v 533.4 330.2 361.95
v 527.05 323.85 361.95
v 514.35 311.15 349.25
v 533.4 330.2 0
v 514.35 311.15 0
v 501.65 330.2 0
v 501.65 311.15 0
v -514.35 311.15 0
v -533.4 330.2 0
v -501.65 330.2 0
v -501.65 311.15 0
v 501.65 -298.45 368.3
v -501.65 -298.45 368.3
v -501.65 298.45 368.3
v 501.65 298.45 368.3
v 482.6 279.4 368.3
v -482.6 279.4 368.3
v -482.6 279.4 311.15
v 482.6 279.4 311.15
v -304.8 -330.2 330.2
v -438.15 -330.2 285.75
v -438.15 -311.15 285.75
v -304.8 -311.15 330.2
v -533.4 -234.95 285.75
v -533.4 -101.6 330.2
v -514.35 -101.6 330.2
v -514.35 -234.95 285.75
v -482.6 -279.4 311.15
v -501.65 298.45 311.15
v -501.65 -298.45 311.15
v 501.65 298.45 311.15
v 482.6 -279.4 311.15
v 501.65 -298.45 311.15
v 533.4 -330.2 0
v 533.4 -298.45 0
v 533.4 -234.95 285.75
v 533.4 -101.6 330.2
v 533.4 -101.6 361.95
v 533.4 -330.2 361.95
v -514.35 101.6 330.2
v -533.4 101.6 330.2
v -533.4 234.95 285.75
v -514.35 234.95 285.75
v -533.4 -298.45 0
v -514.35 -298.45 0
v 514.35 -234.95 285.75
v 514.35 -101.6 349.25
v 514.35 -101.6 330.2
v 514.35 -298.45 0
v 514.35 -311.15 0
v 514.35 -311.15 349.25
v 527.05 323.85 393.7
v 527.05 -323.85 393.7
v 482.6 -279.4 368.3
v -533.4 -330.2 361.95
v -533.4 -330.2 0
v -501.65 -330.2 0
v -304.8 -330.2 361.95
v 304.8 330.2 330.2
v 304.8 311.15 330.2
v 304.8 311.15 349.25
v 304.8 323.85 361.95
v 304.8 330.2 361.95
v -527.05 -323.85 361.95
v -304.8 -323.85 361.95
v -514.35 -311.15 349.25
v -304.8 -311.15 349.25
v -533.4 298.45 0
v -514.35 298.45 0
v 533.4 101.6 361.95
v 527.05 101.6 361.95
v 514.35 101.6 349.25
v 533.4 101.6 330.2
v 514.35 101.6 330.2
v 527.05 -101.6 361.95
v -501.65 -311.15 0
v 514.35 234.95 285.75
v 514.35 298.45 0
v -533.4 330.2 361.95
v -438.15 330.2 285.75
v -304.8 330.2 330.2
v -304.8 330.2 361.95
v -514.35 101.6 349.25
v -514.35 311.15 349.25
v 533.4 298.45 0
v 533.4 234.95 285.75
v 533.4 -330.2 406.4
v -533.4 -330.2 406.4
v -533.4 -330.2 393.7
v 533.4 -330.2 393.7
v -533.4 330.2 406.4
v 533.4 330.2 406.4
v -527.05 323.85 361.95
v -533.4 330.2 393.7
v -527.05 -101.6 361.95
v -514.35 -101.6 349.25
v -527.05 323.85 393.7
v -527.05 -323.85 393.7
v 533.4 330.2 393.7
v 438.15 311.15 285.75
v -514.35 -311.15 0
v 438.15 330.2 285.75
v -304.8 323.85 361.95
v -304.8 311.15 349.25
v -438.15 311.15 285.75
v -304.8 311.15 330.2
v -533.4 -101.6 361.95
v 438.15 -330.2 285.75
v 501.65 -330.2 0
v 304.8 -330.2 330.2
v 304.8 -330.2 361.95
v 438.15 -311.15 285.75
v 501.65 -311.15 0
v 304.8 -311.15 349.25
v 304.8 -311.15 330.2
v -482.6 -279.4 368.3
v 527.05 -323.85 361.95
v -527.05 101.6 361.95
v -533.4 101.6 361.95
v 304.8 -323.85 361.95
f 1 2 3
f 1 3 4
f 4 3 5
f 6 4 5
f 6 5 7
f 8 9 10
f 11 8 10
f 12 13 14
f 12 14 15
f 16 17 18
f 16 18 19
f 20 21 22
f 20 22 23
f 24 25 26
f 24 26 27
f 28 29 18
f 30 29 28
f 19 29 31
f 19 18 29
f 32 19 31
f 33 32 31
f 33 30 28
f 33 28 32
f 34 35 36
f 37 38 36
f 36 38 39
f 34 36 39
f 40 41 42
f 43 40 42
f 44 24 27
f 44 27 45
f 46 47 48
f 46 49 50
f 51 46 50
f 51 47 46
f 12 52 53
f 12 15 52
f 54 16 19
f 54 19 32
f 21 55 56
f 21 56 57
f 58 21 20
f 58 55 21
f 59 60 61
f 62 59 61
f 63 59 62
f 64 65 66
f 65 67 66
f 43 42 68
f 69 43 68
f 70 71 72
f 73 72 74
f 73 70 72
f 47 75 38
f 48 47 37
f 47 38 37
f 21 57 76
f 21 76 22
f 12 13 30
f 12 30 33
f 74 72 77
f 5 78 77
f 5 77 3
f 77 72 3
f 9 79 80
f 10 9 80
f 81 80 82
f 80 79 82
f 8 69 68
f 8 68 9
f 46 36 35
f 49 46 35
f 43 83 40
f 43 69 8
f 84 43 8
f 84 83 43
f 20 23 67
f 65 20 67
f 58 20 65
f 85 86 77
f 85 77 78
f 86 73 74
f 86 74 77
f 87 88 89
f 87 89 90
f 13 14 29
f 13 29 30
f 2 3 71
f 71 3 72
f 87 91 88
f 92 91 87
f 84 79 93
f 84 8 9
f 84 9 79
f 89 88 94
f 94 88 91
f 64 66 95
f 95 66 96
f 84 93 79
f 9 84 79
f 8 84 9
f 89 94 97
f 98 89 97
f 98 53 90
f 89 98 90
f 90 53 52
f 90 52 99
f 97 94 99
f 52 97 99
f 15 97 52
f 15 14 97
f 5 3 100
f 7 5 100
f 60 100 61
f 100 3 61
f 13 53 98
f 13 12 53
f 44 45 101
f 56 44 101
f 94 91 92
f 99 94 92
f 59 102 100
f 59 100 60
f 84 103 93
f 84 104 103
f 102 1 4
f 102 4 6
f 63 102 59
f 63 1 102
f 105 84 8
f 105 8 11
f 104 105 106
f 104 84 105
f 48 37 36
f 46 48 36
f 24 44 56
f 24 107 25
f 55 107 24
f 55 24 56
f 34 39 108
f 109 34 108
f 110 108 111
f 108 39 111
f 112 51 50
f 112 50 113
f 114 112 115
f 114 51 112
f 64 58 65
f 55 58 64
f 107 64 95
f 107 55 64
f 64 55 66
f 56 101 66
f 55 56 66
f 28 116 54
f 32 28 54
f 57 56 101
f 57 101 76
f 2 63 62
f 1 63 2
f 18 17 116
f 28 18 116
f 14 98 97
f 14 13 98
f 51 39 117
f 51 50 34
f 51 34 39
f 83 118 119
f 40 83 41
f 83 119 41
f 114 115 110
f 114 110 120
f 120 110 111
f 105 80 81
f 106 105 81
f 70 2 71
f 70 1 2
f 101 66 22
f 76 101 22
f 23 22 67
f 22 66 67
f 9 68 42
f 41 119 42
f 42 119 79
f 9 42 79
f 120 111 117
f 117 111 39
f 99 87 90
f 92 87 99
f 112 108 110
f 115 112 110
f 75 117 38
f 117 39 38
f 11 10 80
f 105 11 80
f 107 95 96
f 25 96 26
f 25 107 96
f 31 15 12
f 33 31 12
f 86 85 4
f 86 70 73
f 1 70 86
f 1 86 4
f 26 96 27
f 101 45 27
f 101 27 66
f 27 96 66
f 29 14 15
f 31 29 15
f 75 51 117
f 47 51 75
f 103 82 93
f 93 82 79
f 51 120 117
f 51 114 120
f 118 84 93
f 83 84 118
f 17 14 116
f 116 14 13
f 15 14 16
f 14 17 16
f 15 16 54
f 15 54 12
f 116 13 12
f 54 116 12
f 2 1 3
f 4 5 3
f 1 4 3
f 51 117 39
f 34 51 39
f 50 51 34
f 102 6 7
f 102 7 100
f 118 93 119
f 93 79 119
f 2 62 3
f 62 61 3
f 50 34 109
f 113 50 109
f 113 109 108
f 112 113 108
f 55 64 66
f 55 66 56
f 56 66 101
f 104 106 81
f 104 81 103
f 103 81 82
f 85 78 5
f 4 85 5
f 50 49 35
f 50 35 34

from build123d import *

# Parameters (mm, degrees)
F1_W      = 1066.8
F1_H      = 660.4
F2_DEPTH  = 12.7
F3_W      = 1054.1
F3_H      = 647.7
F4_DEPTH  = 25.4
F4_TAPER  = 45
F6_DEPTH  = 19.05
F7_SIZE   = 12.7
F8_SIZE   = 19.04999
F10_DEPTH = 19.05
F11_SIZE  = 12.7
F12_SIZE  = 19.04999
F15_W     = 1003.3
F15_H     = 596.9
F15_W_2   = 965.2
F15_H_2   = 558.8
F16_DEPTH = 57.15


# Not quite as in the source:
# - a fillet or chamfer is up to 0.001 mm smaller than in the source, because OpenCascade refuses the exact size


with BuildPart() as f2:
    # F1 (on offset) → F2 (new body)
    with BuildSketch(Plane.XY.offset(406.4)):
        Rectangle(F1_W, F1_H)
    extrude(amount=-F2_DEPTH)

    # F3 (on face) → F4 (join)
    with BuildSketch(Plane(origin=(0, 0, 393.7), x_dir=(1, 0, 0), z_dir=(0, 0, -1))):
        Rectangle(F3_W, F3_H)
    extrude(amount=F4_DEPTH, taper=F4_TAPER)


with BuildPart() as f6:
    # F5 (on face) → F6 (new body)
    with BuildSketch(Plane.XZ.offset(330.2)):
        Polygon((-304.8, 361.95), (-533.4, 361.95), (-533.4, 0), (-501.65, 0), (-438.15, 285.75), (-304.8, 330.2), align=None)
    extrude(amount=-F6_DEPTH)

    # F7
    f7_edges = [f6.edges().sort_by_distance(p)[0] for p in [
        (-419.1, -311.15, 361.95),
    ]]
    chamfer(f7_edges, length=F7_SIZE)

    # F8 (size 19.05 in the source; OpenCascade refuses exactly that, so slightly less here)
    f8_edges = [f6.edges().sort_by_distance(p)[0] for p in [
        (-533.4, -311.15, 174.625),
    ]]
    chamfer(f8_edges, length=F8_SIZE)


with BuildPart() as f10:
    # F9 (on face) → F10 (new body)
    with BuildSketch(Plane(origin=(-533.4, 0, 0), x_dir=(0, -1, 0), z_dir=(-1, 0, 0))):
        Polygon((234.95, 285.75), (298.45, 0), (330.2, 0), (330.2, 361.95), (101.6, 361.95), (101.6, 330.2), align=None)
    extrude(amount=-F10_DEPTH)

    # F11
    f11_edges = [f10.edges().sort_by_distance(p)[0] for p in [
        (-514.35, -215.9, 361.95),
    ]]
    chamfer(f11_edges, length=F11_SIZE)

    # F12 (size 19.05 in the source; OpenCascade refuses exactly that, so slightly less here)
    f12_edges = [f10.edges().sort_by_distance(p)[0] for p in [
        (-514.35, -330.2, 174.625),
    ]]
    chamfer(f12_edges, length=F12_SIZE)


with BuildPart() as f13_1:
    # F13: instance of F6
    add(f6.part.mirror(Plane.XZ))


with BuildPart() as f13_2:
    # F13: instance of F10
    add(f10.part.mirror(Plane.XZ))


with BuildPart() as f14_1:
    # F14: instance of F6
    add(f6.part.mirror(Plane.YZ))


with BuildPart() as f14_2:
    # F14: instance of F10
    add(f10.part.mirror(Plane.YZ))


with BuildPart() as f14_3:
    # F14: instance of F13_1
    add(f13_1.part.mirror(Plane.YZ))


with BuildPart() as f14_4:
    # F14: instance of F13_2
    add(f13_2.part.mirror(Plane.YZ))


with BuildPart() as f16:
    # F15 (on face) → F16 (new body)
    with BuildSketch(Plane(origin=(0, 0, 368.3), x_dir=(1, 0, 0), z_dir=(0, 0, -1))):
        Rectangle(F15_W, F15_H)
        Rectangle(F15_W_2, F15_H_2, mode=Mode.SUBTRACT)
    extrude(amount=F16_DEPTH)


solid = Compound([f2.part, f6.part, f10.part, f13_1.part, f13_2.part, f14_1.part, f14_2.part, f14_3.part, f14_4.part, f16.part])
